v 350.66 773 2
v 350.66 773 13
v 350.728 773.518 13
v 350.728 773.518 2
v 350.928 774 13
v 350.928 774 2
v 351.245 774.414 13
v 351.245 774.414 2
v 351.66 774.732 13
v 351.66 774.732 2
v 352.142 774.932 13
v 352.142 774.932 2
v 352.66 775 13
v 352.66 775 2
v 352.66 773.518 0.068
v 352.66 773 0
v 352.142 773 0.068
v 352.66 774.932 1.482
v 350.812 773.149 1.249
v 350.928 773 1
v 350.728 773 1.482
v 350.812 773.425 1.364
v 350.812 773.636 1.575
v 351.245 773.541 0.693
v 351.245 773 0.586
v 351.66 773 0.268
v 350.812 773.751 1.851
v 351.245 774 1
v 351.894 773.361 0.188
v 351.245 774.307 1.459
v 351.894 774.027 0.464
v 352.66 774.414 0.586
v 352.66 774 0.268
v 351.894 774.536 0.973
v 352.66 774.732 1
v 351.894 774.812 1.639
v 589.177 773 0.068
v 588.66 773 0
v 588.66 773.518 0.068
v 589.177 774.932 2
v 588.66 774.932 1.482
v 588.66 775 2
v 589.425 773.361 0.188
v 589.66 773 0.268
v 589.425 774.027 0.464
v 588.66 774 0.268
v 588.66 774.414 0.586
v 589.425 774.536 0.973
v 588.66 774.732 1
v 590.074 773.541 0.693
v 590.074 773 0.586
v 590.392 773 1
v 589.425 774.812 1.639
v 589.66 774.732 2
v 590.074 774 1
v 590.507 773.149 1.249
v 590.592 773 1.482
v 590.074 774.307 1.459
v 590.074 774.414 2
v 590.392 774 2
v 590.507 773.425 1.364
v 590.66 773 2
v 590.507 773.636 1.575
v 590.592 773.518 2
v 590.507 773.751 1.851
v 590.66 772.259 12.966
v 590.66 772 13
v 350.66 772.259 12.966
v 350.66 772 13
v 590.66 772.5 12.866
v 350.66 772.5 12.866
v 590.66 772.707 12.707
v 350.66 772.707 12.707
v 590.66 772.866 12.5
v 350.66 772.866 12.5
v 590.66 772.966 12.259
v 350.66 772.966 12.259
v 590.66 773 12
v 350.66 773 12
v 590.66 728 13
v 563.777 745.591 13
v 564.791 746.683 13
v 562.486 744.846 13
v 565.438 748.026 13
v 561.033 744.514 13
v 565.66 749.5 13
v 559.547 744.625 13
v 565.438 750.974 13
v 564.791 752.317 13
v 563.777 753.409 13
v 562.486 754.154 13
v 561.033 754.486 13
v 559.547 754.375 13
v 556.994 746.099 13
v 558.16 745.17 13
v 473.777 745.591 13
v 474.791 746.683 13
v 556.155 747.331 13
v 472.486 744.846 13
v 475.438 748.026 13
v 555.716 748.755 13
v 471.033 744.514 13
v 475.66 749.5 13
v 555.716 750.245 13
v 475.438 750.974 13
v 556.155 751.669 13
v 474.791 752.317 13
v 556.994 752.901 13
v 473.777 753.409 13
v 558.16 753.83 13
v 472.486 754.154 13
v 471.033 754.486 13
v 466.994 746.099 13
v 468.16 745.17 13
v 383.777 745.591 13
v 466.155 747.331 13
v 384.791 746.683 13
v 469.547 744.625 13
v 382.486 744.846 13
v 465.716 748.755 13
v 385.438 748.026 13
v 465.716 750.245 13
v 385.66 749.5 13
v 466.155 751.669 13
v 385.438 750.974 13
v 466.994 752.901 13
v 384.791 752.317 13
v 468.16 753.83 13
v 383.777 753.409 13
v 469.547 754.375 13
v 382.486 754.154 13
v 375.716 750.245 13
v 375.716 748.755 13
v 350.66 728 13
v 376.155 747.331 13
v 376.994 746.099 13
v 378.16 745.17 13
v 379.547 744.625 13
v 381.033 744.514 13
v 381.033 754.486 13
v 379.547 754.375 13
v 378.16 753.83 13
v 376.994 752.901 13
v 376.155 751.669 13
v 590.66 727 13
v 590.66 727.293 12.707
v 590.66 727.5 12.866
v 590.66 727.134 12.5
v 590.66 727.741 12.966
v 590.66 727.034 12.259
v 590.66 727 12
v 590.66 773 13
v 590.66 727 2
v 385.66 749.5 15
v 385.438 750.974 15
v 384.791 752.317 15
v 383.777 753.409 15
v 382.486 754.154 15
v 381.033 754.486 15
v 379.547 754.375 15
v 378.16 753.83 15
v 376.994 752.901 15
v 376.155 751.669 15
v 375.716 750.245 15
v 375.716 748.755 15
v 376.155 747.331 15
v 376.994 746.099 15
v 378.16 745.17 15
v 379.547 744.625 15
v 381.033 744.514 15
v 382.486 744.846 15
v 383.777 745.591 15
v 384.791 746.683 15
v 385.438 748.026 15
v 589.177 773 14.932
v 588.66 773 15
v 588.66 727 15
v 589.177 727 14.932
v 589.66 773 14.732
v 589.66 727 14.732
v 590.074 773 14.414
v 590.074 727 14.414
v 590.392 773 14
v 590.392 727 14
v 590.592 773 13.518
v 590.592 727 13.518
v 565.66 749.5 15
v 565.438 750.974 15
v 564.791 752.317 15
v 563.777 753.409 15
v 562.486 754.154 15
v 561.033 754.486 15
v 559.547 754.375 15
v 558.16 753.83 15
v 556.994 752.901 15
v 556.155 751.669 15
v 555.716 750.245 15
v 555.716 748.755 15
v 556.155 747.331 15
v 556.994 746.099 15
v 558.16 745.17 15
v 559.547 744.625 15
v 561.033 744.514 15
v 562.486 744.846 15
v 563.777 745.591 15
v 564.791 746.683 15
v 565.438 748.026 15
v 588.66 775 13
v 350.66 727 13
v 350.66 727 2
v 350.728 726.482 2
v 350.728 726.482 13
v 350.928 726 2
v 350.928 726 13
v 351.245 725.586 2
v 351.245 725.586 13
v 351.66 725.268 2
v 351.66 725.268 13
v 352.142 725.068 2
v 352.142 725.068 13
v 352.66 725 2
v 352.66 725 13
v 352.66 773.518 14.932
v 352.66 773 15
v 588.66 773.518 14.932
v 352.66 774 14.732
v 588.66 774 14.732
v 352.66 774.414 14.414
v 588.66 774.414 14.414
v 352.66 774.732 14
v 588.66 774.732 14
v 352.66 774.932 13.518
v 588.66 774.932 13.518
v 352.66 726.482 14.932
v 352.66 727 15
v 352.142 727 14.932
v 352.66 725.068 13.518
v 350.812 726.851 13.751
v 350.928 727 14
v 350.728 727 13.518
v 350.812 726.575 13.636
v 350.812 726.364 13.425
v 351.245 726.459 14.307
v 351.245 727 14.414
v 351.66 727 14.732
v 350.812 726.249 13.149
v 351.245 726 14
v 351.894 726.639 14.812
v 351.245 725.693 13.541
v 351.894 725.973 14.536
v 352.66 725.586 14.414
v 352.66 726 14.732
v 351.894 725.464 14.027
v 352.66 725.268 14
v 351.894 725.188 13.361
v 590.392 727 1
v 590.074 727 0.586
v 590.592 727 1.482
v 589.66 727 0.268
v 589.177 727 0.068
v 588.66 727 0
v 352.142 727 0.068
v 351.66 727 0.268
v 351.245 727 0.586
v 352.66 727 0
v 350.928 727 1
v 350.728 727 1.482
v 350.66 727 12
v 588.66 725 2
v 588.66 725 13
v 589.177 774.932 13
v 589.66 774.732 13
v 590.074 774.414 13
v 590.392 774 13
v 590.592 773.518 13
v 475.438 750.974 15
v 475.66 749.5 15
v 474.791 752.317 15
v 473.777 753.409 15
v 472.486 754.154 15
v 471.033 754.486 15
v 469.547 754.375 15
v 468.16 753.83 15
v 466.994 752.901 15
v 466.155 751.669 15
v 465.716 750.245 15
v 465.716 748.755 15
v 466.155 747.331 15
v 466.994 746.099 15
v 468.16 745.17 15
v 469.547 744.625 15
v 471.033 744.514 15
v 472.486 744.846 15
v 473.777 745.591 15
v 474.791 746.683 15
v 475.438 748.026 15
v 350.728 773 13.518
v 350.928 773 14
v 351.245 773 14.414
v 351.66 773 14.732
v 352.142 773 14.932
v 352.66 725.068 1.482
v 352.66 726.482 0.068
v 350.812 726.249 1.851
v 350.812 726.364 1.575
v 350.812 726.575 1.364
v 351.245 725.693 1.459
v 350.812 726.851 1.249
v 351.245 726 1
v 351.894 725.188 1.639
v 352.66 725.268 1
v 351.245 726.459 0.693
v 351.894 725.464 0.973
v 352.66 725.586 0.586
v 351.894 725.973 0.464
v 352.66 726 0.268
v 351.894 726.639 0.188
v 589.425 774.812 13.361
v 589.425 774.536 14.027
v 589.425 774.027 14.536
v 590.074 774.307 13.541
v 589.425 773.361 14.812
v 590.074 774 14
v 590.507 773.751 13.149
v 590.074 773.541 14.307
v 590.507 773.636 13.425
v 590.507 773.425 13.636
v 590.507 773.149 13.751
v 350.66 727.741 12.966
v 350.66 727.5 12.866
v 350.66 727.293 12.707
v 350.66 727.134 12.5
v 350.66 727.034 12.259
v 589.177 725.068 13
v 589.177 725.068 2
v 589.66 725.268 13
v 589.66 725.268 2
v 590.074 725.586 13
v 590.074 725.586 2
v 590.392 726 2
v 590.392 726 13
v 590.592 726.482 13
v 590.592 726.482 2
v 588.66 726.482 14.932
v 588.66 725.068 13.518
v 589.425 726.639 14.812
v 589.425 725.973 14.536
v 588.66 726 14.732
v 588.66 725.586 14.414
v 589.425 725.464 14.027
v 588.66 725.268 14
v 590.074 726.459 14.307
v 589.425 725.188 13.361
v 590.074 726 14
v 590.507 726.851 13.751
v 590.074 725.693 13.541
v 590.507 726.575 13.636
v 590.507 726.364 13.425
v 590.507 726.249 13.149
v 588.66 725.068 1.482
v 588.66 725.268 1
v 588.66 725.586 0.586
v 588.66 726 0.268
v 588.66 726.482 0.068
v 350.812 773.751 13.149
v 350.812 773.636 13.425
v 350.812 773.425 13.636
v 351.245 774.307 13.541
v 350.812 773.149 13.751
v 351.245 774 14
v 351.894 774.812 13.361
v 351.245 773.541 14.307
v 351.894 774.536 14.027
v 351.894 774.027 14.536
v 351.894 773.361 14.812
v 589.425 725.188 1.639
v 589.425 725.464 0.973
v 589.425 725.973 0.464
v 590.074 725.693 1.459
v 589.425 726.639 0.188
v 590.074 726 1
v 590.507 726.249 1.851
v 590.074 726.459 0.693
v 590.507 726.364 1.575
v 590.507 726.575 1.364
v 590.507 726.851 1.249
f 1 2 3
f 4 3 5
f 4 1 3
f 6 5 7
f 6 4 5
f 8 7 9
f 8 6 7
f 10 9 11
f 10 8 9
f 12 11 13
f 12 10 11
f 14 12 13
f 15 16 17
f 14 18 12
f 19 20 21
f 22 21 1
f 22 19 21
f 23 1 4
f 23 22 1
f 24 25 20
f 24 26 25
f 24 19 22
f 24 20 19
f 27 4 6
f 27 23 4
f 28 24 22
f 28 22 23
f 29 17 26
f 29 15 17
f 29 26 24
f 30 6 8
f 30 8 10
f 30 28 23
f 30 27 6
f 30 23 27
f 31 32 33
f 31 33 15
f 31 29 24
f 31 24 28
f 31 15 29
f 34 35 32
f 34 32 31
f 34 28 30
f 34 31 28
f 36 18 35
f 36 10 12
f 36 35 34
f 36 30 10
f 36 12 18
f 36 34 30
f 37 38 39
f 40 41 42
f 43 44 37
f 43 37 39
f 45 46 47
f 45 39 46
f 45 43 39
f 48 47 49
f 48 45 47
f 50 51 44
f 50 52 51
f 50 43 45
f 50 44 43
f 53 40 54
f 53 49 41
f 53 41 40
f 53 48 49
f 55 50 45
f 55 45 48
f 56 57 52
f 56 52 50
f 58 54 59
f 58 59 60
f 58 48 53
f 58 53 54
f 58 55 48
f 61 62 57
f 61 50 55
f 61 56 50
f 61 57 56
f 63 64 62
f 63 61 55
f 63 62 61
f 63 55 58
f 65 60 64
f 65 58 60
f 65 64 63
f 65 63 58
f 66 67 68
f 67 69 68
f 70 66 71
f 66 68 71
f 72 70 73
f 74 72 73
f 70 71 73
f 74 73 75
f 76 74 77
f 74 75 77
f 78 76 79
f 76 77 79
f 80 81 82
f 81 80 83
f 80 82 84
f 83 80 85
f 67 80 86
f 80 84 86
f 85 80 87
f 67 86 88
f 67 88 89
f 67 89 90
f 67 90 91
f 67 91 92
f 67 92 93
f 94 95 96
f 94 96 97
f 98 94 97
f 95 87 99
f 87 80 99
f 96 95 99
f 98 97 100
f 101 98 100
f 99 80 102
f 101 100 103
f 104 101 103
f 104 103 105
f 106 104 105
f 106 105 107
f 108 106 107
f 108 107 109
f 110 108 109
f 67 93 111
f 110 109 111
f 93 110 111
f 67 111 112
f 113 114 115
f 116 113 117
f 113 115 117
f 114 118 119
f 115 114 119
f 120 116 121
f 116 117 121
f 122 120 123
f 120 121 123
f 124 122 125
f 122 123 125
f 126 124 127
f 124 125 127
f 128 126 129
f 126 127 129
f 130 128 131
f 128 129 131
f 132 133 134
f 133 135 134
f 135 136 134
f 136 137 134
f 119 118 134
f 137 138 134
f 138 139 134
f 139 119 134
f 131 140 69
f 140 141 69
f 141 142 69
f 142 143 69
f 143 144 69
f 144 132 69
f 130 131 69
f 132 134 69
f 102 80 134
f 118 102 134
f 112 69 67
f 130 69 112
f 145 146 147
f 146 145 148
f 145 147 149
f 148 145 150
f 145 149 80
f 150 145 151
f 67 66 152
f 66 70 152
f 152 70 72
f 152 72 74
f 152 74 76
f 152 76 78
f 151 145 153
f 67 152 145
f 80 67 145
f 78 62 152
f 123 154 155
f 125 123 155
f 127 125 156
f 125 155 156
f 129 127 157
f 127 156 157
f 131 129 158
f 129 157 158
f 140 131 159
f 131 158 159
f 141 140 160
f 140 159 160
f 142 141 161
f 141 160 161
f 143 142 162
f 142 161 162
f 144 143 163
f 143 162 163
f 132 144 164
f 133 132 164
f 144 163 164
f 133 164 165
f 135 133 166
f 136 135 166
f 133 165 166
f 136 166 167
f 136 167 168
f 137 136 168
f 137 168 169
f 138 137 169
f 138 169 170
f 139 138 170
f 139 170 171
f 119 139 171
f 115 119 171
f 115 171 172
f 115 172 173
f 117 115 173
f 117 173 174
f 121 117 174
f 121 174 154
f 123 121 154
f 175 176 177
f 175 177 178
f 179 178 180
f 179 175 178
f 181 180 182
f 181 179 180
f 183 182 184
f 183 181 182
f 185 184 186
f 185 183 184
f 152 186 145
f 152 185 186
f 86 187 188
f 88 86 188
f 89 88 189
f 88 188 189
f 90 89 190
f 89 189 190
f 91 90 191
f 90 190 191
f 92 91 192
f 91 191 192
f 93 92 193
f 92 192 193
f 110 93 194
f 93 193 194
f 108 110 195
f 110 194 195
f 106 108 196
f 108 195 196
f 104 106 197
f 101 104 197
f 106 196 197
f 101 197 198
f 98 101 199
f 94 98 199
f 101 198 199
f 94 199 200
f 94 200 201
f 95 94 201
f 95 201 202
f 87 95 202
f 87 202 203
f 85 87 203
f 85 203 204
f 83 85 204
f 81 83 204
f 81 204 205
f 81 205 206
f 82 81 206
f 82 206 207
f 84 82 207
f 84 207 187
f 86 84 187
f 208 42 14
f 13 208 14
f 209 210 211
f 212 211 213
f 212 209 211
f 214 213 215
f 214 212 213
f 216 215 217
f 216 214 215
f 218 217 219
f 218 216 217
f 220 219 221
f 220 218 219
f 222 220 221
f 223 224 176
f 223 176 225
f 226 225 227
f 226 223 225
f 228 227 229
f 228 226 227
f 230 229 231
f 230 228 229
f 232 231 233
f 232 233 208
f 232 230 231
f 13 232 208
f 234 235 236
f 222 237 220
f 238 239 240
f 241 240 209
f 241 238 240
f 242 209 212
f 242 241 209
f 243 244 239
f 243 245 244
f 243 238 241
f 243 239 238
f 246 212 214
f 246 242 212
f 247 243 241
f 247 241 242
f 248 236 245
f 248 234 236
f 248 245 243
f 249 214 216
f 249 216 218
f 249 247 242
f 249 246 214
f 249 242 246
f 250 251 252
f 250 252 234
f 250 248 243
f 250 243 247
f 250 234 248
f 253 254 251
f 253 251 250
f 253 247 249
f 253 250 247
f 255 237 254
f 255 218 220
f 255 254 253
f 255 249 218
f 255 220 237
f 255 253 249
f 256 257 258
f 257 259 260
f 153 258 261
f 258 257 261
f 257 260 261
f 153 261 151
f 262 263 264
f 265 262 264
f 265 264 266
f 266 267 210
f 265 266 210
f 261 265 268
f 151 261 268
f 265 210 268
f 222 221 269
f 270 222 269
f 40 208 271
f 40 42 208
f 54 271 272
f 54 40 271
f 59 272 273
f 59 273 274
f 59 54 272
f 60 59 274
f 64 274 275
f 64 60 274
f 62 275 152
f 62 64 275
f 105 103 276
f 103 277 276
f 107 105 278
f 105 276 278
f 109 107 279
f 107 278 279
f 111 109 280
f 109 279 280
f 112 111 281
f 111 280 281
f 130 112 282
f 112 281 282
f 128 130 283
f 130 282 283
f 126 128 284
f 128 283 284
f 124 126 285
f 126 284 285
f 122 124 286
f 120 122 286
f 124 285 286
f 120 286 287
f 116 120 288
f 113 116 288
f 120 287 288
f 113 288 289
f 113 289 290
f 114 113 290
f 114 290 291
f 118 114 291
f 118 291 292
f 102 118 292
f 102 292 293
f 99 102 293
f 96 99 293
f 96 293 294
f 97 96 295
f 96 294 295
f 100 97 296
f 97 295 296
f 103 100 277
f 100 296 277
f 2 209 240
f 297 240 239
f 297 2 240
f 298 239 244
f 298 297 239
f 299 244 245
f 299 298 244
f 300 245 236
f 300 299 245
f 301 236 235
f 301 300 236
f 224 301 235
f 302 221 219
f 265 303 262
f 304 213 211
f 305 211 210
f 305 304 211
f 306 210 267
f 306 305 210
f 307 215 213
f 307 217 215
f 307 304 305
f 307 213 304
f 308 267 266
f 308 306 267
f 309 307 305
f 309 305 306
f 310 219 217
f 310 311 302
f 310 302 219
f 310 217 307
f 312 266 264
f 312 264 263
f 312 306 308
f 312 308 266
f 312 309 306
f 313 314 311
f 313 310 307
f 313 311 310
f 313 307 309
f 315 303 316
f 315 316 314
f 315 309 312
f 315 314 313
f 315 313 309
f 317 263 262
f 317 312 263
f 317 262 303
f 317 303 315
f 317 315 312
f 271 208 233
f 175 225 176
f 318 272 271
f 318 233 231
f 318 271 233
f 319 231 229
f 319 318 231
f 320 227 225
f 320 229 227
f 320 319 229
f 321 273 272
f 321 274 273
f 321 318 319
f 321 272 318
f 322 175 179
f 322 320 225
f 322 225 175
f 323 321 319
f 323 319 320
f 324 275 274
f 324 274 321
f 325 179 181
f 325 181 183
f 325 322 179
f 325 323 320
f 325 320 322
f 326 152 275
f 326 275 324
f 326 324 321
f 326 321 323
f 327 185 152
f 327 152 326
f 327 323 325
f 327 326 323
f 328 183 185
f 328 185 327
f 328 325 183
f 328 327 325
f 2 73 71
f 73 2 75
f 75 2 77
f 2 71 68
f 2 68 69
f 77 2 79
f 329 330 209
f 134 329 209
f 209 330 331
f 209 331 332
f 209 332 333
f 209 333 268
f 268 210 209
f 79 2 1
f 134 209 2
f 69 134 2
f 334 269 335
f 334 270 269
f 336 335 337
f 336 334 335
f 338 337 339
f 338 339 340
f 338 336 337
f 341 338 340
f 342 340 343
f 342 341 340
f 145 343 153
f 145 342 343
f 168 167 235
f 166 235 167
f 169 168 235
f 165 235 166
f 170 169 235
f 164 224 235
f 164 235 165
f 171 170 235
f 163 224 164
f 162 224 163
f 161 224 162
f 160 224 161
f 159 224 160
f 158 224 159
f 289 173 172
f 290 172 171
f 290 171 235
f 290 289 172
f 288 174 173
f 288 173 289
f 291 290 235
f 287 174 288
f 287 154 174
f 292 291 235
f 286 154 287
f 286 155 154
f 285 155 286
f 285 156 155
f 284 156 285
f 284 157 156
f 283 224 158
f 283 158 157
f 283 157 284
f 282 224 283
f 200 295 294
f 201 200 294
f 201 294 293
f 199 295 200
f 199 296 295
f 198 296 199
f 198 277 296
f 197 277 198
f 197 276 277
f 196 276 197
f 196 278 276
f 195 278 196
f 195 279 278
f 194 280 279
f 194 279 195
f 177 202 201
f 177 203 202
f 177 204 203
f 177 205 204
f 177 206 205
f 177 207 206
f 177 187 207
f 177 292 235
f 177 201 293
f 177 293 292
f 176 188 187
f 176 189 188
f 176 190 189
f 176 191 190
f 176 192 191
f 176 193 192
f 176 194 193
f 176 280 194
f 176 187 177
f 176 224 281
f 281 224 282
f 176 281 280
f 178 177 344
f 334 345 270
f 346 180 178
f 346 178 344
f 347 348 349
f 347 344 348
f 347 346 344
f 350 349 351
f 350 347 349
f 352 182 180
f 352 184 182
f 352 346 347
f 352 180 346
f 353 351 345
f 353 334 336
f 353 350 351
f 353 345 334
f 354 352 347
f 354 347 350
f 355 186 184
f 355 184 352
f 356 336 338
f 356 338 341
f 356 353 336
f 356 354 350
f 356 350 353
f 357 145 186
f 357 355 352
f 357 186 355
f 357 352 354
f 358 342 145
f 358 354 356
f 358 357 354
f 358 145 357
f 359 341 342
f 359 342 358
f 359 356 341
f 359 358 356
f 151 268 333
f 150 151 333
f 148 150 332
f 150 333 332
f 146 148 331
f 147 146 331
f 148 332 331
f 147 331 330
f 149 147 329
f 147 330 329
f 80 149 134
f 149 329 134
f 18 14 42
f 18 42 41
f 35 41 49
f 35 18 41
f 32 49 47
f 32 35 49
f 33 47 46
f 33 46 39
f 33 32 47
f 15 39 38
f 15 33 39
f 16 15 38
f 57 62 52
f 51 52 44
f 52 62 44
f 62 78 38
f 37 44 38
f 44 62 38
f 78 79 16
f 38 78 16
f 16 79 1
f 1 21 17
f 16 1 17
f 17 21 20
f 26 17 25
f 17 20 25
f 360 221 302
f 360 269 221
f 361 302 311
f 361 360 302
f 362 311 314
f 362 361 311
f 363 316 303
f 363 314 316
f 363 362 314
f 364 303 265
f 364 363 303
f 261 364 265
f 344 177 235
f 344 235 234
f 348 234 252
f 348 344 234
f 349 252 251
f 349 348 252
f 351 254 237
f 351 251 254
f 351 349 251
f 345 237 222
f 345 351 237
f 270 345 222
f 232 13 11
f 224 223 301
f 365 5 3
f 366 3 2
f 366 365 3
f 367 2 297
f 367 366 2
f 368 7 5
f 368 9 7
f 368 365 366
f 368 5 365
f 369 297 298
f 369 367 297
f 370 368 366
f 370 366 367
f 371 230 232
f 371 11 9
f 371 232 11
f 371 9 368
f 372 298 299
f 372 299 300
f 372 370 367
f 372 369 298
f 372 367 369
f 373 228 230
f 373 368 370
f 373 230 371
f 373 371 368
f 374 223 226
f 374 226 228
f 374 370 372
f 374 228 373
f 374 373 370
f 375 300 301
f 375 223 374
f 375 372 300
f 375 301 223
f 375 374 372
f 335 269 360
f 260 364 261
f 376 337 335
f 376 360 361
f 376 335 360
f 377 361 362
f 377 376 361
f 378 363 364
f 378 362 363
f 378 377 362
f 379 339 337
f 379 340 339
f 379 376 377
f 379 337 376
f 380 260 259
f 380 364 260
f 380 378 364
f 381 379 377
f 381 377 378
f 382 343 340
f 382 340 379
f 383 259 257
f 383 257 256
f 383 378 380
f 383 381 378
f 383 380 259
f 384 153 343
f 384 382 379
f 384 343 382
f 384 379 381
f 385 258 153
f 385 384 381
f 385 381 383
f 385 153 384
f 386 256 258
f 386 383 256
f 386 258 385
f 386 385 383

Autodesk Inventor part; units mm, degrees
ref_plane "YZ Plane" through (0, 0, 0) normal (1, 0, 0) x (0, 1, 0)
ref_plane "XZ Plane" through (0, 0, 0) normal (0, 1, 0) x (-1, 0, 0)
ref_plane "Work Plane1" through (0, 0, 0) normal (0, 0, 1) x (1, 0, 0)
sketch "Sketch1" plane through (0, 0, 0) normal (0, 0, 1) x (1, 0, 0)
  line L0 (350.6597, 725) -> (590.6597, 725)
  line L1 (590.6597, 725) -> (590.6597, 775)
  line L2 (590.6597, 775) -> (350.6597, 775)
  line L3 (350.6597, 775) -> (350.6597, 725)
  line L4 (164.0316, 10) -> (164.0316, 1490) projected
  line L5 (777.2877, 10) -> (164.0316, 10) projected
  line L6 (470.6597, 10) -> (470.6597, 1506) construction
  line L7 (164.0316, 750) -> (680, 750) construction
  point P0 (0, 0)
  point P1 (470.6597, 725)
  point P2 (350.6597, 750)
  dimension "d0" = 240
  dimension "d1" = 50
extrude "Extrusion1" add sketch "Sketch1" along normal blind 15
sketch "Sketch2" plane through (350.6597, 725, 0) normal (-1, 0, 0) x (0, 0, 1)
  line L0 (15, 0) -> (0, 0) projected
  line L1 (0, 0) -> (0, 50) projected
  line L2 (0, 50) -> (15, 50) projected
  line L3 (15, 50) -> (15, 0) projected
  line L4 (12, 48) -> (0, 48)
  line L5 (0, 2) -> (12, 2)
  line L6 (13, 3) -> (13, 47)
  arc A0 (13, 47) -> (12, 48) centre (12, 47) ccw
  arc A1 (12, 2) -> (13, 3) centre (12, 3) ccw
  point P0 (0, -725)
  dimension "d5" = 2
extrude "Extrusion2" cut sketch "Sketch2" against normal through all contours L1 L4 A0 L6 A1 L5
fillet "Fillet1" radius 2 4 edges at (470.6597, 775, 15) (470.6597, 775, 0) (470.6597, 725, 0) (470.6597, 725, 15)
sketch "Sketch3" plane through (0, 0, 15) normal (0, 0, 1) x (1, 0, 0)
  line L0 (350.6597, 727) -> (590.6597, 727) construction
  line L1 (590.6597, 773) -> (590.6597, 727) construction
  line L2 (590.6597, 773) -> (350.6597, 773) construction
  line L3 (350.6597, 727) -> (350.6597, 773) construction
  line L4 (350.6597, 772) -> (590.6597, 772) projected
  line L5 (470.6597, 772) -> (470.6597, 727) construction
  circle A0 centre (470.6597, 749.5) radius 5
  point P0 (0, 0)
  dimension "d10" = 10
extrude "Extrusion3" cut sketch "Sketch3" against normal up to next
pattern_linear "Rectangular Pattern1" count 3 spacing 90 along (1, 0, 0) of "Extrusion3" first direction both ways yes
fillet "Fillet2" radius 2 14 edges at (350.6597, 725.5858, 14.4142) (350.6597, 725, 7.5) (350.6597, 725.5858, 0.5858) (350.6597, 774.4142, 14.4142) (350.6597, 775, 7.5) (350.6597, 774.4142, 0.5858) (350.6597, 750, 15) (590.6597, 774.4142, 14.4142) (590.6597, 775, 7.5) (590.6597, 774.4142, 0.5858) (590.6597, 725.5858, 14.4142) (590.6597, 725, 7.5) (590.6597, 725.5858, 0.5858) (590.6597, 750, 15)
properties part number "support3" material "Stainless Steel"
